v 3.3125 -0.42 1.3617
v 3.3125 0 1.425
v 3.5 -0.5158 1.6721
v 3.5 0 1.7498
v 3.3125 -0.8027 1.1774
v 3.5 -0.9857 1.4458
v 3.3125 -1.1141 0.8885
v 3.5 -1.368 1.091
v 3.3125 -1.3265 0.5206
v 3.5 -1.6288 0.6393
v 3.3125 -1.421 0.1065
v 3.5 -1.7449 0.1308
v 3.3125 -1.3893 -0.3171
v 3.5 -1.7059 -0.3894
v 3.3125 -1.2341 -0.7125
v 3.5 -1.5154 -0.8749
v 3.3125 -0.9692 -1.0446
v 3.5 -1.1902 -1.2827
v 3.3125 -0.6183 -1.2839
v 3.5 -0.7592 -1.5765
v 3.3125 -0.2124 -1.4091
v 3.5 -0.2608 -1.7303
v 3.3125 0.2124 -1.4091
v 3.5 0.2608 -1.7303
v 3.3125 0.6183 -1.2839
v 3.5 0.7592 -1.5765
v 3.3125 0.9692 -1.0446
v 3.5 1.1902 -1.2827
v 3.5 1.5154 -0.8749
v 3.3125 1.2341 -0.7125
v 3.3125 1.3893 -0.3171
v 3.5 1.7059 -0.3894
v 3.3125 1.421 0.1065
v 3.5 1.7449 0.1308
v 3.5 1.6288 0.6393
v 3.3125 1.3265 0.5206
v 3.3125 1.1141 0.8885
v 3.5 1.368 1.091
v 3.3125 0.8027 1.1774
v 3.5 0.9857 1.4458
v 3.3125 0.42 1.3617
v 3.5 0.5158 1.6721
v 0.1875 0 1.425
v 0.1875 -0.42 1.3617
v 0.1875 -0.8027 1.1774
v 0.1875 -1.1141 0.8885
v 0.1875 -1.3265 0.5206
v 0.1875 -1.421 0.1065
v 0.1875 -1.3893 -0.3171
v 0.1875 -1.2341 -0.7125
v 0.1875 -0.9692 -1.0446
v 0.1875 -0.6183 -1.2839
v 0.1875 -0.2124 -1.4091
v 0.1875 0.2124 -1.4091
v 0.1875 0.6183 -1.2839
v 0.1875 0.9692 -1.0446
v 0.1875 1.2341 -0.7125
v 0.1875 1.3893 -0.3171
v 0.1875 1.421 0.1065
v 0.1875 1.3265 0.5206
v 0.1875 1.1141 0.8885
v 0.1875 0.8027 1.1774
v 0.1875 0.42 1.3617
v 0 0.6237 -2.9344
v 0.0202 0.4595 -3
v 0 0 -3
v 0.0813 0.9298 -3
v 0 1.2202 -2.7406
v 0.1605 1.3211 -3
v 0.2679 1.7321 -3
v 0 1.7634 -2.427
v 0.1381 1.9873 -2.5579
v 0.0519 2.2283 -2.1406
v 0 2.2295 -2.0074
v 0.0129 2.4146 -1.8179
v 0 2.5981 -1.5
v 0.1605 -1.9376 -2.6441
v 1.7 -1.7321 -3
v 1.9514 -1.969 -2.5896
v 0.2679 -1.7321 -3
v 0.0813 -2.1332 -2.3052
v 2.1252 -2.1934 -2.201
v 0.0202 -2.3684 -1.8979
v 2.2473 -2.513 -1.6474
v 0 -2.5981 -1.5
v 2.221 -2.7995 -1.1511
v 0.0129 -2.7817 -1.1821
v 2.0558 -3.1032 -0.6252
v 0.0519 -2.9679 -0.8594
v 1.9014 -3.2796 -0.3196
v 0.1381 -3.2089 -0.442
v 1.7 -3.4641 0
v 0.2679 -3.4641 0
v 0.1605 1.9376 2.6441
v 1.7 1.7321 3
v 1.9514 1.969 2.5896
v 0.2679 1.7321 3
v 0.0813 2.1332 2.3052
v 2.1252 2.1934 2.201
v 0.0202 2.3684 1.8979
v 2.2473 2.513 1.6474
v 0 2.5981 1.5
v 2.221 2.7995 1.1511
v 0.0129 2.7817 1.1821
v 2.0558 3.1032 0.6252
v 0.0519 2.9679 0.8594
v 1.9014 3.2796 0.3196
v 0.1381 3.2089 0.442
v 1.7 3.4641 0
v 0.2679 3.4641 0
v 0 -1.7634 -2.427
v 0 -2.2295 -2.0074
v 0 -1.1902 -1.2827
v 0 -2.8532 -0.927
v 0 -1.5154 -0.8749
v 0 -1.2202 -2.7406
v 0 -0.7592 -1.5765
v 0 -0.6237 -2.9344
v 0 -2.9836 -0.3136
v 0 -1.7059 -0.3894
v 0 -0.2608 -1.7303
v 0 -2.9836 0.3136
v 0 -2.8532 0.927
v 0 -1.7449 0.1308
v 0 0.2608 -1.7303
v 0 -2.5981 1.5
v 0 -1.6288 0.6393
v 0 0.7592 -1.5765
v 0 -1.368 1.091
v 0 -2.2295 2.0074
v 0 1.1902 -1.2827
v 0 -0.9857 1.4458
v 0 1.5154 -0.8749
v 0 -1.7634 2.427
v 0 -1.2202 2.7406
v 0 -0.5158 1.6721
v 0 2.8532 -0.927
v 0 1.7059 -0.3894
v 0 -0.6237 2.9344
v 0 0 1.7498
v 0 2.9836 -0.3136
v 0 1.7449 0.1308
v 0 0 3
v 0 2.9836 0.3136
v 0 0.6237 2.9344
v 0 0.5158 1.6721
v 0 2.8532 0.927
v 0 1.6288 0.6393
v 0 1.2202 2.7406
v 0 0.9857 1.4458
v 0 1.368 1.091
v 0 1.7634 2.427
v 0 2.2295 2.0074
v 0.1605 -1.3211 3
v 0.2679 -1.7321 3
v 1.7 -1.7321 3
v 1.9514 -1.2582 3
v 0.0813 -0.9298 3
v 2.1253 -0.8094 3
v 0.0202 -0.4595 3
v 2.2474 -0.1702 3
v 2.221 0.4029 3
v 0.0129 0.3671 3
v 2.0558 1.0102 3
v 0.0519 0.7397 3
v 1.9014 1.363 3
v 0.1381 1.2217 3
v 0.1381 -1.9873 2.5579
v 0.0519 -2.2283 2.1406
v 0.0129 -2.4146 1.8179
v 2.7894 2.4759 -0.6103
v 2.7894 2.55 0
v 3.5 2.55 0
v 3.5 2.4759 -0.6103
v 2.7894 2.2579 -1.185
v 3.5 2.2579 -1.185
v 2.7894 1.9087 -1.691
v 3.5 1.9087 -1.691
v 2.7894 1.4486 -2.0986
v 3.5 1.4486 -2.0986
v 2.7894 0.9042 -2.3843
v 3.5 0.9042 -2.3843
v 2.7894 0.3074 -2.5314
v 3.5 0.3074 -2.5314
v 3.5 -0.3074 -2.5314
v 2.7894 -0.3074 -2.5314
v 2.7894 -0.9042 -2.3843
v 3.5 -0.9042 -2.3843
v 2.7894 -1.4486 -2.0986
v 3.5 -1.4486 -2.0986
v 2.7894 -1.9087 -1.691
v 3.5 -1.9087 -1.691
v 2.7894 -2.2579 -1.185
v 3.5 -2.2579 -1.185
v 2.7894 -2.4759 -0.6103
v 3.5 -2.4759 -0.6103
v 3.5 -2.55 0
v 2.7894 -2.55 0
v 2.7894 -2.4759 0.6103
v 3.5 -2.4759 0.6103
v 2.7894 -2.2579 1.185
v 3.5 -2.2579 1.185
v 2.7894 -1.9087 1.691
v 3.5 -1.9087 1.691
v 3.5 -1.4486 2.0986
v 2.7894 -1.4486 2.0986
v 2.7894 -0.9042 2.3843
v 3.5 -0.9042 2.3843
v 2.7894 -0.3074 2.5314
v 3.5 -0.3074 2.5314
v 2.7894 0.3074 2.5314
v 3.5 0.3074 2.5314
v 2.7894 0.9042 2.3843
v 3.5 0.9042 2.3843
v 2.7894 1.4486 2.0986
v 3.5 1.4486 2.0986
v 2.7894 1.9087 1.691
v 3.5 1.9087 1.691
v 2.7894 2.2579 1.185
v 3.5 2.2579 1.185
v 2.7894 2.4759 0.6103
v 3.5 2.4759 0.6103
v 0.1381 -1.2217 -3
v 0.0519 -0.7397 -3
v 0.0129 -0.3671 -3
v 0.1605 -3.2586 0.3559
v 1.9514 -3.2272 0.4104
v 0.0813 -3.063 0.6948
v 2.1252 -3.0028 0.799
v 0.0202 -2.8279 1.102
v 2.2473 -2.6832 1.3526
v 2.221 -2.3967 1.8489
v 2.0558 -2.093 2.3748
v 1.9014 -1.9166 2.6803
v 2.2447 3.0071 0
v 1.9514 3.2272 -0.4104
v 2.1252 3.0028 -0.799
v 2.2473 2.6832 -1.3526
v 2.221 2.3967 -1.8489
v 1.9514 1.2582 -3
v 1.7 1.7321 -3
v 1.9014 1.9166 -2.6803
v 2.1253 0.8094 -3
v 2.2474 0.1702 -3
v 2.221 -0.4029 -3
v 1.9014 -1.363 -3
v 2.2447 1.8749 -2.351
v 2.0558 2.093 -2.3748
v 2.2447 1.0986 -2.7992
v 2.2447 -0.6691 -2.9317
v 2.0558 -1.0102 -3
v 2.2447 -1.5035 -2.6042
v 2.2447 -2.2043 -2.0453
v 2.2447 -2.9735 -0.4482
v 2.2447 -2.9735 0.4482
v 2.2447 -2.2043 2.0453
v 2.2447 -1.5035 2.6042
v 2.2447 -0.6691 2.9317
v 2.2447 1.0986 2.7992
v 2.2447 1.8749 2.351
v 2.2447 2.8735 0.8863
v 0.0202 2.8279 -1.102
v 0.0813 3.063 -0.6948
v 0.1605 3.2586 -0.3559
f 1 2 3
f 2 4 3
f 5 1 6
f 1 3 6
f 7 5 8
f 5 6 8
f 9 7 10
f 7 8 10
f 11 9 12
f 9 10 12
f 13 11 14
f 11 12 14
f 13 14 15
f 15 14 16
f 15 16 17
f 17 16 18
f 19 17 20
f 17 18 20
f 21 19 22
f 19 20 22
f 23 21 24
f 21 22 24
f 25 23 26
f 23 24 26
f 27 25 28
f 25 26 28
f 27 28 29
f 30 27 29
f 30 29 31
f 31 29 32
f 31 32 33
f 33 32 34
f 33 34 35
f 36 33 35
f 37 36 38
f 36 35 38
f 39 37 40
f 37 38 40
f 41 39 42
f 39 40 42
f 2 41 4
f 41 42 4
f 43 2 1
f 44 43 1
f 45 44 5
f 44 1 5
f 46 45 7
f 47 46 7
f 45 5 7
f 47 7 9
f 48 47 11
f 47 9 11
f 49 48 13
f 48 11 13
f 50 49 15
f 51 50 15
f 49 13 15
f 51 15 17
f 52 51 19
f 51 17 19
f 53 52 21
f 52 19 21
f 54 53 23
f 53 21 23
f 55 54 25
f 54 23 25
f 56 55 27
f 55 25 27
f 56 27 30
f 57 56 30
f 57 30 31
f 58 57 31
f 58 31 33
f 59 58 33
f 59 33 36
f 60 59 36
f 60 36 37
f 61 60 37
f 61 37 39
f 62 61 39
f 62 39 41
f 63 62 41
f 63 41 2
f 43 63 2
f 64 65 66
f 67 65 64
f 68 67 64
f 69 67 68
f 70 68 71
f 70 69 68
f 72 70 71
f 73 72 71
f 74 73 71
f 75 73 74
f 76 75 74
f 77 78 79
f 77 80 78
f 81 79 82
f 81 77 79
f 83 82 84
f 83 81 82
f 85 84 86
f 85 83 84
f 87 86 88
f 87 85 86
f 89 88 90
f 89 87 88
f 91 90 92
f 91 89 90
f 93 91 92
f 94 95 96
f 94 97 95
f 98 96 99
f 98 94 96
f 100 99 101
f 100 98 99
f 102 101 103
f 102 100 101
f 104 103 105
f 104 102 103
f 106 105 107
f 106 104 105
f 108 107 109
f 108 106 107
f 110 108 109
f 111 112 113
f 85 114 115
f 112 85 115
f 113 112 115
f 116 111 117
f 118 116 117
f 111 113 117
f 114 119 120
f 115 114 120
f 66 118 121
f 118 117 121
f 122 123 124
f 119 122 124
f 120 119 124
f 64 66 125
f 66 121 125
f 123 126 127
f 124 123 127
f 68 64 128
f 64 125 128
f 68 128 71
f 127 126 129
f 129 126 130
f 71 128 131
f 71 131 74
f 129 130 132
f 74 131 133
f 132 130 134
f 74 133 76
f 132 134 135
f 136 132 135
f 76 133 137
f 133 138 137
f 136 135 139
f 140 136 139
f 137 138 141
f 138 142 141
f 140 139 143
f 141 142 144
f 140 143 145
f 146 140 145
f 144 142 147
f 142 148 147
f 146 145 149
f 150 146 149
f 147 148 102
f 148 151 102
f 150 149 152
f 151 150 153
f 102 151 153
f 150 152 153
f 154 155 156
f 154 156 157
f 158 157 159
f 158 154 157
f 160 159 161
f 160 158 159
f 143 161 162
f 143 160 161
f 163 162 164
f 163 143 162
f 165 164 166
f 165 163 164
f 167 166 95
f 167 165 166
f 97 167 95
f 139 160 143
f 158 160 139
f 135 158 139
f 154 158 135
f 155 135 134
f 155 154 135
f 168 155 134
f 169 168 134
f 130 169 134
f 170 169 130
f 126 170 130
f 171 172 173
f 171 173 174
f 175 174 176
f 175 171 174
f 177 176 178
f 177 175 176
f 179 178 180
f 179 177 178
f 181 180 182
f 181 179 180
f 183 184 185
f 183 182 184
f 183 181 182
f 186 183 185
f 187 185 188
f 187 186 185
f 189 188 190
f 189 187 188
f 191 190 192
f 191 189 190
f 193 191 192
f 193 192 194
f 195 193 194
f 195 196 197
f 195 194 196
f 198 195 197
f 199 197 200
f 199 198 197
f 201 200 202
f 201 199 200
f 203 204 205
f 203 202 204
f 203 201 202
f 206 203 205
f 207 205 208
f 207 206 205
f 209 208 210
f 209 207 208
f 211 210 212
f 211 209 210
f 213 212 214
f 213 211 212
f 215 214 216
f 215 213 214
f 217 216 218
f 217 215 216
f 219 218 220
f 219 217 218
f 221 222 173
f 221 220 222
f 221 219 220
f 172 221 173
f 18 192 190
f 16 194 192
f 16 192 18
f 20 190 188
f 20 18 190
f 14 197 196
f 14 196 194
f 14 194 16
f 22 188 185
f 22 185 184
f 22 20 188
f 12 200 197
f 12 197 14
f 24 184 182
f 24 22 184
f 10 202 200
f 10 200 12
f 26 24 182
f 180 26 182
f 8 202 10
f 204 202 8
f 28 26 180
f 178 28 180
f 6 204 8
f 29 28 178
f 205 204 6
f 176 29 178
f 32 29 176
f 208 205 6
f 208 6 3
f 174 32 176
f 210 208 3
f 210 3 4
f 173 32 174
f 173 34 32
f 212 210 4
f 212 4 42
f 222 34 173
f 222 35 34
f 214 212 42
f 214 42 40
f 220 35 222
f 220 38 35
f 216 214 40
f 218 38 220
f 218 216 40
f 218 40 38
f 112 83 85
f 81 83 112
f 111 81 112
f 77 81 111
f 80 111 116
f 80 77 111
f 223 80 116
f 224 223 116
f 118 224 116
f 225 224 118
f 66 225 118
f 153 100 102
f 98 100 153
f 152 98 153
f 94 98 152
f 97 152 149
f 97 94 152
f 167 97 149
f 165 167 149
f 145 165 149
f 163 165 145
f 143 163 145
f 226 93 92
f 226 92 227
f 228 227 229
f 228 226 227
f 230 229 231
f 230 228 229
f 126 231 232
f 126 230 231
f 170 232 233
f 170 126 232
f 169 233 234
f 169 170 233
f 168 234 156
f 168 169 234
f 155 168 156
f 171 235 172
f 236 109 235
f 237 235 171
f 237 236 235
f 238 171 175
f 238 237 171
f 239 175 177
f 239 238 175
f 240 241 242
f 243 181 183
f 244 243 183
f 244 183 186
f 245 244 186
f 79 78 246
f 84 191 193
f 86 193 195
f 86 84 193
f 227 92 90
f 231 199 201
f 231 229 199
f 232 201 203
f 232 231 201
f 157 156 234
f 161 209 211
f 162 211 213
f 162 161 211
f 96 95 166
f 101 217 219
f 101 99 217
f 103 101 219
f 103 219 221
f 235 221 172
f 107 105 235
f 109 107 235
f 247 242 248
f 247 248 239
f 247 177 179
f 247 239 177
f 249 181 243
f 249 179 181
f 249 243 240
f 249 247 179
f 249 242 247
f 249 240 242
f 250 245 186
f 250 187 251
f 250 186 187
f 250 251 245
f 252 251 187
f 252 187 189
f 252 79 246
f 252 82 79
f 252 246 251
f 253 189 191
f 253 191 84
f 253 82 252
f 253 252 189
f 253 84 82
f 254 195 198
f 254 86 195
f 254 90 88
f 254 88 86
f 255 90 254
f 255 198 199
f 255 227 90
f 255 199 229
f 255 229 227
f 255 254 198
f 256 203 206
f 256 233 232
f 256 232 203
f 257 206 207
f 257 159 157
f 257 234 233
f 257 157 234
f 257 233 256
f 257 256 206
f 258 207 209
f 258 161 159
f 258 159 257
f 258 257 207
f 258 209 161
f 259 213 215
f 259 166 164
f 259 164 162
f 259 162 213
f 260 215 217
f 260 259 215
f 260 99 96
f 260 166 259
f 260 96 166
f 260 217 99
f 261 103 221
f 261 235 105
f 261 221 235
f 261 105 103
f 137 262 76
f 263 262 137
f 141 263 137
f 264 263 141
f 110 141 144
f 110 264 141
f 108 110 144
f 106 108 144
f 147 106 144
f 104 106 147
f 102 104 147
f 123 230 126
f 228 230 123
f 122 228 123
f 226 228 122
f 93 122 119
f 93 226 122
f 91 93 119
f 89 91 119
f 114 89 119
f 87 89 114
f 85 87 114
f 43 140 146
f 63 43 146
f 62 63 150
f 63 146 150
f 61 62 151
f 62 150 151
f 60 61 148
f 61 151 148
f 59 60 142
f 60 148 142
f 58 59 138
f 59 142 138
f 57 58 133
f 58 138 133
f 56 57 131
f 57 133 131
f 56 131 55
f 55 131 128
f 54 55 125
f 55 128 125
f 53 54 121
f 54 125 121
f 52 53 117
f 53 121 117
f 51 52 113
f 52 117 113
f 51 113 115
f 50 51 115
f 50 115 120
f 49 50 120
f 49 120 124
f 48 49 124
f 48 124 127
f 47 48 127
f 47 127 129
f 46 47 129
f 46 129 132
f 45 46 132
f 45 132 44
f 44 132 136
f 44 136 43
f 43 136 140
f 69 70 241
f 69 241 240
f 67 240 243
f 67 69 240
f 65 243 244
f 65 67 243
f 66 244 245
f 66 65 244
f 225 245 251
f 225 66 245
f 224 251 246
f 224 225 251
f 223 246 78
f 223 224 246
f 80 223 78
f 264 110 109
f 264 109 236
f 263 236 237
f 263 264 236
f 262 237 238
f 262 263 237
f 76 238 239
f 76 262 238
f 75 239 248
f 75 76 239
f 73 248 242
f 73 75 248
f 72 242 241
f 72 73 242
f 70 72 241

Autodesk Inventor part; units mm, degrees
ref_plane "YZ Plane" through (0, 0, 0) normal (1, 0, 0) x (0, 1, 0)
ref_plane "XZ Plane" through (0, 0, 0) normal (0, 1, 0) x (-1, 0, 0)
sketch "Esquisse1" plane through (0, 0, 0) normal (1, 0, 0) x (0, 1, 0)
  line L0 (-3.4641, 0) -> (-1.7321, 3)
  line L1 (-1.7321, 3) -> (1.7321, 3)
  line L2 (1.7321, 3) -> (3.4641, 0)
  line L3 (3.4641, 0) -> (1.7321, -3)
  line L4 (1.7321, -3) -> (-1.7321, -3)
  line L5 (-1.7321, -3) -> (-3.4641, 0)
  point P0 (0, 0)
  point P1 (0, 0)
  dimension "d0" = 6.9282
extrude "Corps" add sketch "Esquisse1" along normal blind 3.5
sketch "Esquisse2" plane through (0, 0, 0) normal (-1, 0, 0) x (0, 0, 1)
  line L0 (0, -4.8497) -> (0, 4.8497) projected
  line L1 (-4.2, 0) -> (4.2, 0) projected
  point P0 (0, 0)
hole "Filetage" at (0, 0, 0) direction (1, 0, 0) diameter 2.85 end through all thread size "M3.5x0.6" class "6H" standard "ANSI Metric M Profile"
chamfer "Chanfrein1" distance 0.3248 angle 30 1 edges at (0, 0, -1.425) measured on face at (0, -2.123, -1.2698)
chamfer "Chanfrein2" distance 0.3248 angle 30 1 edges at (3.5, 0, -1.425) measured on face at (3.5, -2.123, -1.2698)
sketch "Esquisse3" plane through (0, 0, 0) normal (0, 0, 1) x (1, 0, 0)
  line L0 (0, 1.7321) -> (0, 3.4641) projected
  line L1 (0, 3.4641) -> (3.5, 3.4641) projected
  line L2 (3.5, 1.7321) -> (3.5, 3.4641) projected
  line L3 (-0.7, 0) -> (4.2, 0) projected
  line L4 (0.2679, 3.4641) -> (0, 3)
  line L5 (3.5, 2.55) -> (2.7894, 2.55)
  line L6 (2.7894, 2.55) -> (1.7, 3.4641)
  dimension "d3" = 30
  dimension "d5" = 6
  dimension "d6" = 5.1
  dimension "d8" = 50
  dimension "d9" = 1.7
revolve "Chanfrein3" cut sketch "Esquisse3" angle 360 about axis through (-10, 0, 0) along (1, 0, 0)
ref_plane "Work Plane1" through (9.8107, 0, 0) normal (0, 0, 1) x (-1, 0, 0)
equation "\"d0\" = 1.1547 * SW"
equation "\"d1\" = KOH"
equation "\"d3\" = ANG1"
equation "\"d5\" = SW0"
equation "\"d6\" = SW1"
equation "\"d8\" = ANG2"
equation "\"d9\" = KOH1"
equation "\"d10\" = -0.5 * GD1 + 0.5 * NND"
equation "\"d39\" = -0.5 * GD1 + 0.5 * NND"
equation "\"d12\" = -0.5 * GD1 + 0.5 * NND"
equation "\"d40\" = -0.5 * GD1 + 0.5 * NND"
equation "\"ANG1\" = 30deg"
equation "\"ANG2\" = 50deg"
equation "\"NND\" = 3.5"
equation "\"KOH\" = 3.5"
equation "\"SW\" = 6"
equation "\"SW0\" = SW"
equation "\"SW1\" = 0.85 * SW"
equation "\"KOH1\" = 1.7"
equation "\"GUL\" = 0.541266 * PTC"
equation "\"THREADDIA\" = 3.5"
equation "\"TOA\" = 30deg"
equation "\"PTC\" = 0.6"
equation "\"E0\" = 1.155 * SW"
equation "\"GAL\" = 0.541266 * PTC"
equation "\"GD1\" = 2.850481"
properties part number "ANSI B18.16.3M - Property Class 5 and 10 - Metric M3.5 x 0.6 Type de métal" material "Acier, doux"
